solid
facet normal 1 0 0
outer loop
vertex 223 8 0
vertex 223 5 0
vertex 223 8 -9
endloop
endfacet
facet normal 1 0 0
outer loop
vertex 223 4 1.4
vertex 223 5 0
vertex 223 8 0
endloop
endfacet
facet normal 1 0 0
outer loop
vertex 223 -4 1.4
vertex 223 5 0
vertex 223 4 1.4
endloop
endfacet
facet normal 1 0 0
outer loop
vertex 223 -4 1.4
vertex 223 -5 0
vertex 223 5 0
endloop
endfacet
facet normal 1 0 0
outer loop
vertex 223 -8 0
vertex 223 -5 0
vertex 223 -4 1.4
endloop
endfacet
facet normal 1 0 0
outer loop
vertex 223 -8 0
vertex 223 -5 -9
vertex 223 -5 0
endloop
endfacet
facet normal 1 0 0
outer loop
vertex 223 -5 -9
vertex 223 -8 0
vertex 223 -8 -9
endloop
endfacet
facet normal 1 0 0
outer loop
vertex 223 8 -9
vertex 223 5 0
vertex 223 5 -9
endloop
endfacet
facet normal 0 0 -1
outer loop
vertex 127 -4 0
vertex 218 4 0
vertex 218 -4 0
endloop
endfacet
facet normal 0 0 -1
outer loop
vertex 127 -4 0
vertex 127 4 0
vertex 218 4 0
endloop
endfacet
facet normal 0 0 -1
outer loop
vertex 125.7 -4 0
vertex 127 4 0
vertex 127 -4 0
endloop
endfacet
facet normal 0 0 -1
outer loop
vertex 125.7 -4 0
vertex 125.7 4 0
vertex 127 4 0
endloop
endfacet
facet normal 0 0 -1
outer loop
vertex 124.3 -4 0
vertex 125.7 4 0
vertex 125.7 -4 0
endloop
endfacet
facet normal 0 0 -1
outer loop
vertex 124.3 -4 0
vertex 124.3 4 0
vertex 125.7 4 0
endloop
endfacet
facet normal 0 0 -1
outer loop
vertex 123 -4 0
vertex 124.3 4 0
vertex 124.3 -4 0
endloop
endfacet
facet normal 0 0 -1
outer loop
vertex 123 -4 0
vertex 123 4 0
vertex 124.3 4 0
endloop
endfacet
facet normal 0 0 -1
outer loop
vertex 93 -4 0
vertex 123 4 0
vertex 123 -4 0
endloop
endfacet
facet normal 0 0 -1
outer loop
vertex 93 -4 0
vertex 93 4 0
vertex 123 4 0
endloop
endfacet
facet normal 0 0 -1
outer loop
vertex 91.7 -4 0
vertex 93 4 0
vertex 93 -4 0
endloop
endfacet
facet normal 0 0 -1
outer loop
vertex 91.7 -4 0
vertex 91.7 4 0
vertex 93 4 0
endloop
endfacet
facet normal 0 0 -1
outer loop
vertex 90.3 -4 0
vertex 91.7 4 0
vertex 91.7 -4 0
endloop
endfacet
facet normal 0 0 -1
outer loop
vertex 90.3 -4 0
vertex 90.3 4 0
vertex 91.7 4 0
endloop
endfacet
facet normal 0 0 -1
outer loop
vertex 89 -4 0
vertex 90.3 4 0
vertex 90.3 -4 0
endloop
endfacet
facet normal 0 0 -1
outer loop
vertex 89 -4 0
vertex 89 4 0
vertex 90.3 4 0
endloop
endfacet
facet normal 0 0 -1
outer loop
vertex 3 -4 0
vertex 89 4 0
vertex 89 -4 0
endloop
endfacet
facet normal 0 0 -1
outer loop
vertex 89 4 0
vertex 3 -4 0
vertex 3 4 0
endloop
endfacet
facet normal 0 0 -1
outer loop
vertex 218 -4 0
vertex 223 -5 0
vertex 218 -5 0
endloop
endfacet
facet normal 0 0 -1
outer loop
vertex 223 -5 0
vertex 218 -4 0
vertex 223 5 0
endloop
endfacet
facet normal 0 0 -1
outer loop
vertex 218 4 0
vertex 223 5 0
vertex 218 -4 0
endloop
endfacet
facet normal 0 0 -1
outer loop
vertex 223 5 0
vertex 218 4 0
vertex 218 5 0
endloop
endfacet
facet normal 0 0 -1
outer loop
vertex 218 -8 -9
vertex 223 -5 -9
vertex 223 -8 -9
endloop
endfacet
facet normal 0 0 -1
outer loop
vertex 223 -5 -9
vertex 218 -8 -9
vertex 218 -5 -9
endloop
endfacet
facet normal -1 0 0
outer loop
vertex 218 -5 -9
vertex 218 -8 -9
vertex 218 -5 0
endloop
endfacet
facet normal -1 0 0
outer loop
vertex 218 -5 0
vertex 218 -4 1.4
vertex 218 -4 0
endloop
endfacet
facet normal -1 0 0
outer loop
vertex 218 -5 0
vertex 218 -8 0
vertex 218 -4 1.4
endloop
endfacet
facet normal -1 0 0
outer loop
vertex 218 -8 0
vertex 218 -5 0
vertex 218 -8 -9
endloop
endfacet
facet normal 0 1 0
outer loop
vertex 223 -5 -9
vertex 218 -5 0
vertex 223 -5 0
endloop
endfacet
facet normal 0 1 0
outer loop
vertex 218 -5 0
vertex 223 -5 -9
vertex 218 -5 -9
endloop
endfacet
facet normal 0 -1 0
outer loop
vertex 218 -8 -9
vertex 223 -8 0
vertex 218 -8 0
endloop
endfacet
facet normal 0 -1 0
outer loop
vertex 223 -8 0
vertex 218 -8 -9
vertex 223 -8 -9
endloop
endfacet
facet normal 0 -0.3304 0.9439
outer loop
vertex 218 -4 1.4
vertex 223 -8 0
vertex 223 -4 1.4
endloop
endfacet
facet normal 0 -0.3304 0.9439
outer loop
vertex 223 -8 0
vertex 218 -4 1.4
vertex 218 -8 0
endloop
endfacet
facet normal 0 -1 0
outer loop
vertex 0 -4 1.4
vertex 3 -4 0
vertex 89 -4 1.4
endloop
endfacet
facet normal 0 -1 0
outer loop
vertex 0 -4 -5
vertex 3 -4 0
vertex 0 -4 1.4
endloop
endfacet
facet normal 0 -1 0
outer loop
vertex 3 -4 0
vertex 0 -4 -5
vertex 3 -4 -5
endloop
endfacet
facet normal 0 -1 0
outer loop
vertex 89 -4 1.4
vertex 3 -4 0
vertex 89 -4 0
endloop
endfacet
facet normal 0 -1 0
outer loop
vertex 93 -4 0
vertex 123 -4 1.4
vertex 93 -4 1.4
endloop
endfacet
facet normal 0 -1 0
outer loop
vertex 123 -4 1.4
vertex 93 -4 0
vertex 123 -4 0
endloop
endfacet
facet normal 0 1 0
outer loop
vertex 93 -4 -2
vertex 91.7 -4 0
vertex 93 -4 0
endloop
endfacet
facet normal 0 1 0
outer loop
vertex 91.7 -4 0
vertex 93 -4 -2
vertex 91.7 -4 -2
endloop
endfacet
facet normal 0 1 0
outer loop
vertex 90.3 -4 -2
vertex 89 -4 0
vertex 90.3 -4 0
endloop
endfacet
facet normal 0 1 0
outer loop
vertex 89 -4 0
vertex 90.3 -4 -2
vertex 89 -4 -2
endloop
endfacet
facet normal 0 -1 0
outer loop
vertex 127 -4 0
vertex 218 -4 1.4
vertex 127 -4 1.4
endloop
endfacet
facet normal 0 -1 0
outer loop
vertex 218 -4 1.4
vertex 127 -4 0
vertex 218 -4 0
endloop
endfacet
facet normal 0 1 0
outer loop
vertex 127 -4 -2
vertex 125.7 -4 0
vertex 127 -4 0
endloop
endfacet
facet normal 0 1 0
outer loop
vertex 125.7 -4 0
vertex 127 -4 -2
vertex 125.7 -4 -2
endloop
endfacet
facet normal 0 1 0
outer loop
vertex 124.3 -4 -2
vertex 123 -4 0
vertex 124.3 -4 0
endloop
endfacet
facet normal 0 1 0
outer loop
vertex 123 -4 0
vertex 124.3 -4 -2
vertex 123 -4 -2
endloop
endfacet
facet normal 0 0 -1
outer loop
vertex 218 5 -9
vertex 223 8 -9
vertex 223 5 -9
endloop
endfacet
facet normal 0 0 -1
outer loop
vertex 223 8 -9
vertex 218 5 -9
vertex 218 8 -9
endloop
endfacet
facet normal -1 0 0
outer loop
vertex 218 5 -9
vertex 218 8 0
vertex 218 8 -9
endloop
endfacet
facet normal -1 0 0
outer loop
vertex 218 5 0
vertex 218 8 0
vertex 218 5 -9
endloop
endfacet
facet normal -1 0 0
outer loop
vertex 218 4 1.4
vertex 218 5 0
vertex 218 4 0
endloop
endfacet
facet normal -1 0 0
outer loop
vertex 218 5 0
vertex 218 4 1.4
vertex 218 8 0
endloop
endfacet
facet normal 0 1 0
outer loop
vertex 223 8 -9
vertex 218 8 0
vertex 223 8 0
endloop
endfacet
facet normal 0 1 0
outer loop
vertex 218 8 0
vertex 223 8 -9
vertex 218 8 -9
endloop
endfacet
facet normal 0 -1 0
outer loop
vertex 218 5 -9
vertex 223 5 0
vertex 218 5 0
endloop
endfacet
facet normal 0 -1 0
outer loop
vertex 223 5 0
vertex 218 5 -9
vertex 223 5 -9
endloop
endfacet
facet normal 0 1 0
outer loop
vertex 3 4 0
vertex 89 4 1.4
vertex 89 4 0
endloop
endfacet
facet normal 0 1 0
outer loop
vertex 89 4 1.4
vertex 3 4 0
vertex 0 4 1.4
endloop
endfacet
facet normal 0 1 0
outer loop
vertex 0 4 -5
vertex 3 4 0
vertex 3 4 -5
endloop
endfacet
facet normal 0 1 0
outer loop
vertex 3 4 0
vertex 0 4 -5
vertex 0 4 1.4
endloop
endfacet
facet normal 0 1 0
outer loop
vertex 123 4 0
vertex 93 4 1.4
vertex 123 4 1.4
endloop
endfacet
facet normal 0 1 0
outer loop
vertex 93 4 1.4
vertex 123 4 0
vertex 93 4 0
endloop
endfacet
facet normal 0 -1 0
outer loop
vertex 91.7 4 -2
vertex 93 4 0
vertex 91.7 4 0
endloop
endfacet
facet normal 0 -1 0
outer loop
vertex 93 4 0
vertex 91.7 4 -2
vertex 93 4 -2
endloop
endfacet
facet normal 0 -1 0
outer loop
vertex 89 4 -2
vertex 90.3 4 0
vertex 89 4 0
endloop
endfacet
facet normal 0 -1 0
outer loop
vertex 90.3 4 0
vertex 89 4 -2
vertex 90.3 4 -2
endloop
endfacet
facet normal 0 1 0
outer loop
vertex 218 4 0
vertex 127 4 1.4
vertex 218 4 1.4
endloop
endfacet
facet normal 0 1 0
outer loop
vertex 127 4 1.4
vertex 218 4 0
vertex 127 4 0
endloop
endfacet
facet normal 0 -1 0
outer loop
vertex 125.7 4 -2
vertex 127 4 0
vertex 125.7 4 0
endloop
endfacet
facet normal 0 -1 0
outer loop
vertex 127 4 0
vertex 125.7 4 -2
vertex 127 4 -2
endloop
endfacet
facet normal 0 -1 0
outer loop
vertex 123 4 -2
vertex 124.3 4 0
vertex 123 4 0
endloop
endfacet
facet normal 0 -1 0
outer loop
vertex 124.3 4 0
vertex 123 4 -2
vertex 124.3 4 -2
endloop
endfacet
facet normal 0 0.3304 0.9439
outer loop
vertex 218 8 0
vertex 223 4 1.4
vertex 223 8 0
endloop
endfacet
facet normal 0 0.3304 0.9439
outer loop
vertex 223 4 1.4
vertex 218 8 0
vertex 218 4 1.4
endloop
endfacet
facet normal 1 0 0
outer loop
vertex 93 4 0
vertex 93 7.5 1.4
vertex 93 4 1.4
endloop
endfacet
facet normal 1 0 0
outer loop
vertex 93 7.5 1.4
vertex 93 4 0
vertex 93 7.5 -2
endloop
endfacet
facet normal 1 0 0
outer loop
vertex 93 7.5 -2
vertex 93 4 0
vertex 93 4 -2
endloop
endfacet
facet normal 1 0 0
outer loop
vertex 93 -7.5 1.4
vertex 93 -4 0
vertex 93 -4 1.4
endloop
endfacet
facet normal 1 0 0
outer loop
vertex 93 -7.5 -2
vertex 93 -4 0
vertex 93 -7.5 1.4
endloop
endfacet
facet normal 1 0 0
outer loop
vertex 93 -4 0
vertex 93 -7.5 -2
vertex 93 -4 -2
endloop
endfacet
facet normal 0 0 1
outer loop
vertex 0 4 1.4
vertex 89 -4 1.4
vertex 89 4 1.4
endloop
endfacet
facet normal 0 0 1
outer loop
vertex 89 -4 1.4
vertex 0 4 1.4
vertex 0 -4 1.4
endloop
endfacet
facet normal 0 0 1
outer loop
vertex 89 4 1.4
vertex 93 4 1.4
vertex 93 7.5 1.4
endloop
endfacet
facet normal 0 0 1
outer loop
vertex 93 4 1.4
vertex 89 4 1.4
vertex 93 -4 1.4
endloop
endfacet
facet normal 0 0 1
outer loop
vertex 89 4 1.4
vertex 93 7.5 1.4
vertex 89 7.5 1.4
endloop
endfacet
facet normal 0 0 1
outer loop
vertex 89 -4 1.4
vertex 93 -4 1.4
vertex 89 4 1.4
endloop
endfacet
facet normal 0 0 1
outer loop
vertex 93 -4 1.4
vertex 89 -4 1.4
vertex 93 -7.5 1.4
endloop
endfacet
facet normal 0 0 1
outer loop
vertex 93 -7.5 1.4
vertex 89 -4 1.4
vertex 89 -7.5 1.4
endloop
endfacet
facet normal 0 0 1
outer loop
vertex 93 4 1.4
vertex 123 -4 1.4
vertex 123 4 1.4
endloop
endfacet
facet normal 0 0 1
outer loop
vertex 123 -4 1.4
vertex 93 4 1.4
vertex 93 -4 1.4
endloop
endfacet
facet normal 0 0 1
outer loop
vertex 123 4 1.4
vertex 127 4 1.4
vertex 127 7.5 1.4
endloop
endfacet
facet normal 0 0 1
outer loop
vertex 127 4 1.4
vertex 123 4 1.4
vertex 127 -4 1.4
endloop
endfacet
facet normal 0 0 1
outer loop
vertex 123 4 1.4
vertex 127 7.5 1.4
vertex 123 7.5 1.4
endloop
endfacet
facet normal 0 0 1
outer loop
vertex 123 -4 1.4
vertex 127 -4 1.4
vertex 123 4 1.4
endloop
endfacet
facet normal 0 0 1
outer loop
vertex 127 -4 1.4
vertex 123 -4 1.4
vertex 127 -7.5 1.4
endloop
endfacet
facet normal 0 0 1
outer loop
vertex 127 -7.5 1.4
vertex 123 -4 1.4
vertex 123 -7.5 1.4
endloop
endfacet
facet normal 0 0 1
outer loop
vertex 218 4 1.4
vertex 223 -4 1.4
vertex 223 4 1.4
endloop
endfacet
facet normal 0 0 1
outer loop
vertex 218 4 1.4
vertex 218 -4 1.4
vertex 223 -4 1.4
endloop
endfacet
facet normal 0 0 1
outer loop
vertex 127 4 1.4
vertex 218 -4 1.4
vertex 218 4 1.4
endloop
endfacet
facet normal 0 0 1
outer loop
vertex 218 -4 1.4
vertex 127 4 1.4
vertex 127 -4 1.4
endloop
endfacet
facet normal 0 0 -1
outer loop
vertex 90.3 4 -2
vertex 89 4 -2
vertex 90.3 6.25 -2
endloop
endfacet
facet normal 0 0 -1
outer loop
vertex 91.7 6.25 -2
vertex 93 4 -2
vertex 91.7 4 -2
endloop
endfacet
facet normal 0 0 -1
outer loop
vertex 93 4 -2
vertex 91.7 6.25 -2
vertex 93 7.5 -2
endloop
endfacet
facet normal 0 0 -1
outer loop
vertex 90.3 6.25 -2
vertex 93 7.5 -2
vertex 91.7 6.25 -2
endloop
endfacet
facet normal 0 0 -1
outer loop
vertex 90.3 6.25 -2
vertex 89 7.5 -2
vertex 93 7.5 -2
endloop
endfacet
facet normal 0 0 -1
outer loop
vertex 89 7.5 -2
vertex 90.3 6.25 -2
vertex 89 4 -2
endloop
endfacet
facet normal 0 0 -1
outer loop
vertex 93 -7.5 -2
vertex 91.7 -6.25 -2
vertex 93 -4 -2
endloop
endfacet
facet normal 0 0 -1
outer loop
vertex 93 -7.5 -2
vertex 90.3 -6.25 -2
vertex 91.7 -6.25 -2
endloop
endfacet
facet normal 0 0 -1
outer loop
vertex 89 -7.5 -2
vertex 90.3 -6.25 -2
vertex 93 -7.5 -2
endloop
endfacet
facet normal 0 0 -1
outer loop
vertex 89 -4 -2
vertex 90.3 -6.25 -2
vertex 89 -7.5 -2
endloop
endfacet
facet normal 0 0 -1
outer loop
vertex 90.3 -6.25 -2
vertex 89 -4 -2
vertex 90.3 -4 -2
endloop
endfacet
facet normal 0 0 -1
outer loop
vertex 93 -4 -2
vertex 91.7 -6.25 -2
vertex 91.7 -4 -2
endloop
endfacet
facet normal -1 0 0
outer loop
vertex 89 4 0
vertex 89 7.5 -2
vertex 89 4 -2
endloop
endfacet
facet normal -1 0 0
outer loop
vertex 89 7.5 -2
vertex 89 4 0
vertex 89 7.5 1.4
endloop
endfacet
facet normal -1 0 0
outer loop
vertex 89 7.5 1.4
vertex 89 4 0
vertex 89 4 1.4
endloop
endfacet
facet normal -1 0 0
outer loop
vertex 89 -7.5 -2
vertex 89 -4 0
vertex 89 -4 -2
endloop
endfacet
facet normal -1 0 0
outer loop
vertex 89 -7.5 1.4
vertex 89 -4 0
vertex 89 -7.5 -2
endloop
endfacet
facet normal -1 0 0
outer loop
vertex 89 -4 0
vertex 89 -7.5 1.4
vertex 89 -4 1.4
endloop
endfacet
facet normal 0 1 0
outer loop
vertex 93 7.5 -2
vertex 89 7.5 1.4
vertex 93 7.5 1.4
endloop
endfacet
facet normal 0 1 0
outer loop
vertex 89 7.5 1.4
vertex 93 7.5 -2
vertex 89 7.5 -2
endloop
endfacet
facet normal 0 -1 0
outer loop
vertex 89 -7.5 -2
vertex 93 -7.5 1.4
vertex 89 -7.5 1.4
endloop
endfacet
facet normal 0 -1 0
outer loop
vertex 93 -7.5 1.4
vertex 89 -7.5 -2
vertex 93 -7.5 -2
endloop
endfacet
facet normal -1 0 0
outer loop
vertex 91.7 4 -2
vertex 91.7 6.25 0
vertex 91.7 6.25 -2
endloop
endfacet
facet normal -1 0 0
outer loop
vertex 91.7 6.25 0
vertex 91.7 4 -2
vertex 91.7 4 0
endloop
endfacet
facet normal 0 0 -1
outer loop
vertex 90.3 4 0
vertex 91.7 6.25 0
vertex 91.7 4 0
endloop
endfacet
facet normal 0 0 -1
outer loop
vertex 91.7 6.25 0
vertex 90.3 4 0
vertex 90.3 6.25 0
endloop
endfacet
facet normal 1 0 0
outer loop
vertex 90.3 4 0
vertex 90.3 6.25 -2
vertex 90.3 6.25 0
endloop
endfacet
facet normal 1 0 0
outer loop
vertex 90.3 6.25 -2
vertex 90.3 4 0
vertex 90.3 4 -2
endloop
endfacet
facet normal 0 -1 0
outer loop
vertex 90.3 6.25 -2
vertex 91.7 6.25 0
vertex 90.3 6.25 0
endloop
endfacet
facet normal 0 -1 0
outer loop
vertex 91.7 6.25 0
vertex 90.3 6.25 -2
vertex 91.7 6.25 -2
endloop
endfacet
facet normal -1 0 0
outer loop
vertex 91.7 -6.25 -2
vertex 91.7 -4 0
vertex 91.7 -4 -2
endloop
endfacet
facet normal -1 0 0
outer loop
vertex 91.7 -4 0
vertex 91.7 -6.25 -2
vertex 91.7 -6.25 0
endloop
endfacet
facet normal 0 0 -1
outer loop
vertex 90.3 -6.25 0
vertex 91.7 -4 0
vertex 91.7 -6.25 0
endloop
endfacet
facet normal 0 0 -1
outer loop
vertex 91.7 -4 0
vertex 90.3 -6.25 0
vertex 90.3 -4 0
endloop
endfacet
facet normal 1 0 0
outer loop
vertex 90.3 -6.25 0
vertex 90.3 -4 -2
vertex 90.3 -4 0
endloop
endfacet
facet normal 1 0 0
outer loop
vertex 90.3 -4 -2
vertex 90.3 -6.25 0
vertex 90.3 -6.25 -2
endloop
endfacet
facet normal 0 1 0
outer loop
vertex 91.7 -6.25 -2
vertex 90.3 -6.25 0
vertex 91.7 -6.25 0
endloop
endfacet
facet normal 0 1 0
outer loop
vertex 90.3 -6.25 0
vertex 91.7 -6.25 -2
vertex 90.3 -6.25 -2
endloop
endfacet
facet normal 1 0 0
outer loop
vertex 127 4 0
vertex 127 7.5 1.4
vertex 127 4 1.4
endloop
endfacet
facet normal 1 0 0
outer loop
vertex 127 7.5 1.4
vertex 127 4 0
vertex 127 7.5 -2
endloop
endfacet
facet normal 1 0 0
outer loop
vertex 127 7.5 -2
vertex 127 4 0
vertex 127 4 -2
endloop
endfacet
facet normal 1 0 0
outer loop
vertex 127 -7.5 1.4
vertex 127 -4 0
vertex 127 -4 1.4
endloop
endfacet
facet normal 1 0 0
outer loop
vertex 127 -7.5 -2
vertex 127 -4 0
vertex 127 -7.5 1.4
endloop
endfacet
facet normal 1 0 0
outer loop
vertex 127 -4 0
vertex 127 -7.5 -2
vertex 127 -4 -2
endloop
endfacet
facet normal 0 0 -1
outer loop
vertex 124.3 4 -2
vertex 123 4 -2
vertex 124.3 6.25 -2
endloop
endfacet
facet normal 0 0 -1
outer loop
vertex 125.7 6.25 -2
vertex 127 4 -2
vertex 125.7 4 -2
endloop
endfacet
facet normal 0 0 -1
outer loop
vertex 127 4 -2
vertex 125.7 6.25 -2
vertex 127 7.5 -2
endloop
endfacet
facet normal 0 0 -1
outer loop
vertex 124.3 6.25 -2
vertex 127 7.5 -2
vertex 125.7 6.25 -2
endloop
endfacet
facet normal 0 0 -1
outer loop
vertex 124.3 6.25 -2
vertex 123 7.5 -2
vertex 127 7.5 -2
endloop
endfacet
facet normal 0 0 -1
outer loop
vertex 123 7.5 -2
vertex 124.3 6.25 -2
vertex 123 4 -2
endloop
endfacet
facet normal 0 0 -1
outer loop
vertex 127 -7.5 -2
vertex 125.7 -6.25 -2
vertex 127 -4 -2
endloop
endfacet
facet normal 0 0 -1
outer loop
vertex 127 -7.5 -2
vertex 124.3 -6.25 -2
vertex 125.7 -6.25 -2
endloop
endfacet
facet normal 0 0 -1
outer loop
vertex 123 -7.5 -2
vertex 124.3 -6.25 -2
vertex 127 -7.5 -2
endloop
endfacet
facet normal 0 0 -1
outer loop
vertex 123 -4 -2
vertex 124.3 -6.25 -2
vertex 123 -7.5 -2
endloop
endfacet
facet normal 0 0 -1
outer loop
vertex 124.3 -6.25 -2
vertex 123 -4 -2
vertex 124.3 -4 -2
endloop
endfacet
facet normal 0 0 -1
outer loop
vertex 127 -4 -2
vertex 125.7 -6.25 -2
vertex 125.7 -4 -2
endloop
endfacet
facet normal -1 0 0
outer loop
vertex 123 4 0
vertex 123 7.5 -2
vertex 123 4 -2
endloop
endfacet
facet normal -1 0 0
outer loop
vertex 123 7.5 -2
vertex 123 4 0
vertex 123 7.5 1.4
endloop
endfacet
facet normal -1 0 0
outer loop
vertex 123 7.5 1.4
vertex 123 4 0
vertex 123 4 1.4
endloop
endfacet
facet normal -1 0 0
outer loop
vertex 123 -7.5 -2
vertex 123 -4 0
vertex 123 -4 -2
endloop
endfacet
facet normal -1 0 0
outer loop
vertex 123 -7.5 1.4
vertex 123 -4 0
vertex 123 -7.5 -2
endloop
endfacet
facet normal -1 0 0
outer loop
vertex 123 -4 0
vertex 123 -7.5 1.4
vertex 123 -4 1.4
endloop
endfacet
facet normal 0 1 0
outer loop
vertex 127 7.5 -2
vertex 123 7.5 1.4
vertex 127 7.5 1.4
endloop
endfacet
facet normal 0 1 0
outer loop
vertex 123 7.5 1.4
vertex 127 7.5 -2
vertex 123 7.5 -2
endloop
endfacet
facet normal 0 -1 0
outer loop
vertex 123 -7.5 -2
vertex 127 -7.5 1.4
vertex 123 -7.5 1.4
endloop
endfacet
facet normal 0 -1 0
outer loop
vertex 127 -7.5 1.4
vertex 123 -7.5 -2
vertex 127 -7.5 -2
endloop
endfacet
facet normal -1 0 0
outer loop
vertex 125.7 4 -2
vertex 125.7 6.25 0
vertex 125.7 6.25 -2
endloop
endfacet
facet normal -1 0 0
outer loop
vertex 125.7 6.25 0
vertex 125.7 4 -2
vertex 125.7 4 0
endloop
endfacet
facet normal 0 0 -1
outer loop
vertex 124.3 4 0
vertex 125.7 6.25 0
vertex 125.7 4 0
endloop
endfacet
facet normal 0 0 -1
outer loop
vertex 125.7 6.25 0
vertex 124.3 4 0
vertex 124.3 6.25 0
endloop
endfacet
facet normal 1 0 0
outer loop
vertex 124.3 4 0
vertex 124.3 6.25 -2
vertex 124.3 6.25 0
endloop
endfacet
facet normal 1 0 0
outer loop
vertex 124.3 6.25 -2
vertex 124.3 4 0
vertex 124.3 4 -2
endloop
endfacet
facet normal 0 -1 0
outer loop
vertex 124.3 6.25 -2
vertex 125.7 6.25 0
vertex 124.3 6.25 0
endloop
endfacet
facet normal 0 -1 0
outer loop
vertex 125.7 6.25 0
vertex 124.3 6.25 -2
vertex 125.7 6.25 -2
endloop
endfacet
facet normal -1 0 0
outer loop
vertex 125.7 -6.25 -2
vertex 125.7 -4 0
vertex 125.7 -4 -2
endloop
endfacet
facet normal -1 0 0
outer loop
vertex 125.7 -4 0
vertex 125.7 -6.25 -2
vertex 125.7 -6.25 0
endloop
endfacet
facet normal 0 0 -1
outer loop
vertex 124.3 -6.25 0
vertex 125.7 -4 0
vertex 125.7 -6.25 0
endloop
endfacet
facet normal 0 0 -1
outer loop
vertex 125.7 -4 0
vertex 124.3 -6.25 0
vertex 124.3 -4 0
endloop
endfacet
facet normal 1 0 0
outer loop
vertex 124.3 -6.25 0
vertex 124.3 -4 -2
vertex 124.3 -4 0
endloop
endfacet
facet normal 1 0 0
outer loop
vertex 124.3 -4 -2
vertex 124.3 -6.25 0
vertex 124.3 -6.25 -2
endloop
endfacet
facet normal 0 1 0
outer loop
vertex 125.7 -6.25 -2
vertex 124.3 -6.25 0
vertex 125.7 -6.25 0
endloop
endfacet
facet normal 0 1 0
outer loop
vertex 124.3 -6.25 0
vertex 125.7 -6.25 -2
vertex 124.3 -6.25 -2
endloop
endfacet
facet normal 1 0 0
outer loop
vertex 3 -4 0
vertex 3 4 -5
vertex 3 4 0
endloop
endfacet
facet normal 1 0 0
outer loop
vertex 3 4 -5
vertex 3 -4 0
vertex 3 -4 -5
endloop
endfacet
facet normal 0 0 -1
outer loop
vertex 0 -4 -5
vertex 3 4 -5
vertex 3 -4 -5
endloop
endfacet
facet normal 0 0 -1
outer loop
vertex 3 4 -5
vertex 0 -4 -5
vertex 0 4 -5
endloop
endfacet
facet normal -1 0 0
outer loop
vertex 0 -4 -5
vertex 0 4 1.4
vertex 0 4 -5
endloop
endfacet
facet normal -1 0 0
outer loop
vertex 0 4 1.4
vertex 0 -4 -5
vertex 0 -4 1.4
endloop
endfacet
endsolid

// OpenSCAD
laenge = 220 + 3;
dicke = 1.4;
breite = 8;

// länge bis 1. pfosten: 91mm
// länge zwischen pfosten 34mm

// 46mm höhe umschaltplatine
// 51mm höhe sützen
// 42mm höhe hinten
// 49mm höhe bei den außenstützen

stuetzeLaenge = 1.4;
stuetzeBreite = 2.5; // 2.3;
stuetzeAbstand = 10;


brueckeBreite = 15;
brueckeLaenge = 4;
brueckeTiefe = 2;


module streifen() {
    translate([0, -breite / 2, 0])
    cube([laenge, breite, dicke]);
}

module stuetze() {
    translate([-stuetzeLaenge/2, -stuetzeBreite/2, -brueckeTiefe])
    cube([stuetzeLaenge, stuetzeBreite, brueckeTiefe]);
}

module bruecke() {
    difference() {
        color("green")
        translate([-brueckeLaenge/2, -brueckeBreite/2, -brueckeTiefe])
        cube([brueckeLaenge, brueckeBreite, dicke + brueckeTiefe]);
    
        translate([0, stuetzeAbstand/2, 0])
        stuetze();
        translate([0, -stuetzeAbstand/2, 0])
        stuetze();
        translate([-brueckeLaenge/2, -breite/2, -brueckeTiefe])
        cube([brueckeLaenge, breite, dicke + brueckeTiefe]);
    }
}

module auflage() {
    auflageDicke = 51 - 46;
    color("red")
    translate([0, -breite / 2, -auflageDicke])
    cube([3, breite, auflageDicke]);
}

module auflageHinten() {
    auflageLaenge = 5;
    auflageDicke = 51 - 42;
    auflageBreite = 3;
    breiteOffset = 1;
    color("orange")
    translate([laenge - auflageLaenge, -breite / 2 - auflageBreite - breiteOffset, -auflageDicke])
    union() {
        cube([auflageLaenge, auflageBreite, auflageDicke]);
        translate([0, 0, auflageDicke])
        prism(auflageLaenge, auflageBreite + breiteOffset, dicke);
    }
    color("orange")
    translate([laenge - auflageLaenge, breite / 2 + breiteOffset, -auflageDicke])
    union() {
        cube([auflageLaenge, auflageBreite, auflageDicke]);
        translate([0, auflageBreite, auflageDicke])
        mirror([0, 1, 0])
        prism(auflageLaenge, auflageBreite + breiteOffset, dicke);
    }
}

module auflageHintenAlt() {
    auflageLaenge = 5;
    auflageDicke = 51 - 42;
    auflageBreite = 3;
    breiteOffset = 1;
    color("red")
    translate([laenge - auflageLaenge, -breite / 2 - auflageBreite, -auflageDicke])
    cube([auflageLaenge, auflageBreite, auflageDicke + dicke]);
    color("red")
    translate([laenge - auflageLaenge, breite / 2, -auflageDicke])
    cube([auflageLaenge, auflageBreite, auflageDicke + dicke]);
}

module prism(l, w, h) {
    polyhedron(
        points=[[0,0,0], [l,0,0], [l,w,0], [0,w,0], [0,w,h], [l,w,h]],
        faces=[[0,1,2,3],[5,4,3,2],[0,4,5,1],[0,3,4],[5,2,1]]
    );
}

// intersection() {
//    union() {
        auflage();
        auflageHinten();
        // auflageHintenAlt();
        streifen();

        translate([91, 0, 0])
        bruecke();
        translate([91 + 34, 0, 0])
        bruecke();
//    };
//    translate([85, -40, -40])
//    cube([50, 1000, 10000]); 
// }
